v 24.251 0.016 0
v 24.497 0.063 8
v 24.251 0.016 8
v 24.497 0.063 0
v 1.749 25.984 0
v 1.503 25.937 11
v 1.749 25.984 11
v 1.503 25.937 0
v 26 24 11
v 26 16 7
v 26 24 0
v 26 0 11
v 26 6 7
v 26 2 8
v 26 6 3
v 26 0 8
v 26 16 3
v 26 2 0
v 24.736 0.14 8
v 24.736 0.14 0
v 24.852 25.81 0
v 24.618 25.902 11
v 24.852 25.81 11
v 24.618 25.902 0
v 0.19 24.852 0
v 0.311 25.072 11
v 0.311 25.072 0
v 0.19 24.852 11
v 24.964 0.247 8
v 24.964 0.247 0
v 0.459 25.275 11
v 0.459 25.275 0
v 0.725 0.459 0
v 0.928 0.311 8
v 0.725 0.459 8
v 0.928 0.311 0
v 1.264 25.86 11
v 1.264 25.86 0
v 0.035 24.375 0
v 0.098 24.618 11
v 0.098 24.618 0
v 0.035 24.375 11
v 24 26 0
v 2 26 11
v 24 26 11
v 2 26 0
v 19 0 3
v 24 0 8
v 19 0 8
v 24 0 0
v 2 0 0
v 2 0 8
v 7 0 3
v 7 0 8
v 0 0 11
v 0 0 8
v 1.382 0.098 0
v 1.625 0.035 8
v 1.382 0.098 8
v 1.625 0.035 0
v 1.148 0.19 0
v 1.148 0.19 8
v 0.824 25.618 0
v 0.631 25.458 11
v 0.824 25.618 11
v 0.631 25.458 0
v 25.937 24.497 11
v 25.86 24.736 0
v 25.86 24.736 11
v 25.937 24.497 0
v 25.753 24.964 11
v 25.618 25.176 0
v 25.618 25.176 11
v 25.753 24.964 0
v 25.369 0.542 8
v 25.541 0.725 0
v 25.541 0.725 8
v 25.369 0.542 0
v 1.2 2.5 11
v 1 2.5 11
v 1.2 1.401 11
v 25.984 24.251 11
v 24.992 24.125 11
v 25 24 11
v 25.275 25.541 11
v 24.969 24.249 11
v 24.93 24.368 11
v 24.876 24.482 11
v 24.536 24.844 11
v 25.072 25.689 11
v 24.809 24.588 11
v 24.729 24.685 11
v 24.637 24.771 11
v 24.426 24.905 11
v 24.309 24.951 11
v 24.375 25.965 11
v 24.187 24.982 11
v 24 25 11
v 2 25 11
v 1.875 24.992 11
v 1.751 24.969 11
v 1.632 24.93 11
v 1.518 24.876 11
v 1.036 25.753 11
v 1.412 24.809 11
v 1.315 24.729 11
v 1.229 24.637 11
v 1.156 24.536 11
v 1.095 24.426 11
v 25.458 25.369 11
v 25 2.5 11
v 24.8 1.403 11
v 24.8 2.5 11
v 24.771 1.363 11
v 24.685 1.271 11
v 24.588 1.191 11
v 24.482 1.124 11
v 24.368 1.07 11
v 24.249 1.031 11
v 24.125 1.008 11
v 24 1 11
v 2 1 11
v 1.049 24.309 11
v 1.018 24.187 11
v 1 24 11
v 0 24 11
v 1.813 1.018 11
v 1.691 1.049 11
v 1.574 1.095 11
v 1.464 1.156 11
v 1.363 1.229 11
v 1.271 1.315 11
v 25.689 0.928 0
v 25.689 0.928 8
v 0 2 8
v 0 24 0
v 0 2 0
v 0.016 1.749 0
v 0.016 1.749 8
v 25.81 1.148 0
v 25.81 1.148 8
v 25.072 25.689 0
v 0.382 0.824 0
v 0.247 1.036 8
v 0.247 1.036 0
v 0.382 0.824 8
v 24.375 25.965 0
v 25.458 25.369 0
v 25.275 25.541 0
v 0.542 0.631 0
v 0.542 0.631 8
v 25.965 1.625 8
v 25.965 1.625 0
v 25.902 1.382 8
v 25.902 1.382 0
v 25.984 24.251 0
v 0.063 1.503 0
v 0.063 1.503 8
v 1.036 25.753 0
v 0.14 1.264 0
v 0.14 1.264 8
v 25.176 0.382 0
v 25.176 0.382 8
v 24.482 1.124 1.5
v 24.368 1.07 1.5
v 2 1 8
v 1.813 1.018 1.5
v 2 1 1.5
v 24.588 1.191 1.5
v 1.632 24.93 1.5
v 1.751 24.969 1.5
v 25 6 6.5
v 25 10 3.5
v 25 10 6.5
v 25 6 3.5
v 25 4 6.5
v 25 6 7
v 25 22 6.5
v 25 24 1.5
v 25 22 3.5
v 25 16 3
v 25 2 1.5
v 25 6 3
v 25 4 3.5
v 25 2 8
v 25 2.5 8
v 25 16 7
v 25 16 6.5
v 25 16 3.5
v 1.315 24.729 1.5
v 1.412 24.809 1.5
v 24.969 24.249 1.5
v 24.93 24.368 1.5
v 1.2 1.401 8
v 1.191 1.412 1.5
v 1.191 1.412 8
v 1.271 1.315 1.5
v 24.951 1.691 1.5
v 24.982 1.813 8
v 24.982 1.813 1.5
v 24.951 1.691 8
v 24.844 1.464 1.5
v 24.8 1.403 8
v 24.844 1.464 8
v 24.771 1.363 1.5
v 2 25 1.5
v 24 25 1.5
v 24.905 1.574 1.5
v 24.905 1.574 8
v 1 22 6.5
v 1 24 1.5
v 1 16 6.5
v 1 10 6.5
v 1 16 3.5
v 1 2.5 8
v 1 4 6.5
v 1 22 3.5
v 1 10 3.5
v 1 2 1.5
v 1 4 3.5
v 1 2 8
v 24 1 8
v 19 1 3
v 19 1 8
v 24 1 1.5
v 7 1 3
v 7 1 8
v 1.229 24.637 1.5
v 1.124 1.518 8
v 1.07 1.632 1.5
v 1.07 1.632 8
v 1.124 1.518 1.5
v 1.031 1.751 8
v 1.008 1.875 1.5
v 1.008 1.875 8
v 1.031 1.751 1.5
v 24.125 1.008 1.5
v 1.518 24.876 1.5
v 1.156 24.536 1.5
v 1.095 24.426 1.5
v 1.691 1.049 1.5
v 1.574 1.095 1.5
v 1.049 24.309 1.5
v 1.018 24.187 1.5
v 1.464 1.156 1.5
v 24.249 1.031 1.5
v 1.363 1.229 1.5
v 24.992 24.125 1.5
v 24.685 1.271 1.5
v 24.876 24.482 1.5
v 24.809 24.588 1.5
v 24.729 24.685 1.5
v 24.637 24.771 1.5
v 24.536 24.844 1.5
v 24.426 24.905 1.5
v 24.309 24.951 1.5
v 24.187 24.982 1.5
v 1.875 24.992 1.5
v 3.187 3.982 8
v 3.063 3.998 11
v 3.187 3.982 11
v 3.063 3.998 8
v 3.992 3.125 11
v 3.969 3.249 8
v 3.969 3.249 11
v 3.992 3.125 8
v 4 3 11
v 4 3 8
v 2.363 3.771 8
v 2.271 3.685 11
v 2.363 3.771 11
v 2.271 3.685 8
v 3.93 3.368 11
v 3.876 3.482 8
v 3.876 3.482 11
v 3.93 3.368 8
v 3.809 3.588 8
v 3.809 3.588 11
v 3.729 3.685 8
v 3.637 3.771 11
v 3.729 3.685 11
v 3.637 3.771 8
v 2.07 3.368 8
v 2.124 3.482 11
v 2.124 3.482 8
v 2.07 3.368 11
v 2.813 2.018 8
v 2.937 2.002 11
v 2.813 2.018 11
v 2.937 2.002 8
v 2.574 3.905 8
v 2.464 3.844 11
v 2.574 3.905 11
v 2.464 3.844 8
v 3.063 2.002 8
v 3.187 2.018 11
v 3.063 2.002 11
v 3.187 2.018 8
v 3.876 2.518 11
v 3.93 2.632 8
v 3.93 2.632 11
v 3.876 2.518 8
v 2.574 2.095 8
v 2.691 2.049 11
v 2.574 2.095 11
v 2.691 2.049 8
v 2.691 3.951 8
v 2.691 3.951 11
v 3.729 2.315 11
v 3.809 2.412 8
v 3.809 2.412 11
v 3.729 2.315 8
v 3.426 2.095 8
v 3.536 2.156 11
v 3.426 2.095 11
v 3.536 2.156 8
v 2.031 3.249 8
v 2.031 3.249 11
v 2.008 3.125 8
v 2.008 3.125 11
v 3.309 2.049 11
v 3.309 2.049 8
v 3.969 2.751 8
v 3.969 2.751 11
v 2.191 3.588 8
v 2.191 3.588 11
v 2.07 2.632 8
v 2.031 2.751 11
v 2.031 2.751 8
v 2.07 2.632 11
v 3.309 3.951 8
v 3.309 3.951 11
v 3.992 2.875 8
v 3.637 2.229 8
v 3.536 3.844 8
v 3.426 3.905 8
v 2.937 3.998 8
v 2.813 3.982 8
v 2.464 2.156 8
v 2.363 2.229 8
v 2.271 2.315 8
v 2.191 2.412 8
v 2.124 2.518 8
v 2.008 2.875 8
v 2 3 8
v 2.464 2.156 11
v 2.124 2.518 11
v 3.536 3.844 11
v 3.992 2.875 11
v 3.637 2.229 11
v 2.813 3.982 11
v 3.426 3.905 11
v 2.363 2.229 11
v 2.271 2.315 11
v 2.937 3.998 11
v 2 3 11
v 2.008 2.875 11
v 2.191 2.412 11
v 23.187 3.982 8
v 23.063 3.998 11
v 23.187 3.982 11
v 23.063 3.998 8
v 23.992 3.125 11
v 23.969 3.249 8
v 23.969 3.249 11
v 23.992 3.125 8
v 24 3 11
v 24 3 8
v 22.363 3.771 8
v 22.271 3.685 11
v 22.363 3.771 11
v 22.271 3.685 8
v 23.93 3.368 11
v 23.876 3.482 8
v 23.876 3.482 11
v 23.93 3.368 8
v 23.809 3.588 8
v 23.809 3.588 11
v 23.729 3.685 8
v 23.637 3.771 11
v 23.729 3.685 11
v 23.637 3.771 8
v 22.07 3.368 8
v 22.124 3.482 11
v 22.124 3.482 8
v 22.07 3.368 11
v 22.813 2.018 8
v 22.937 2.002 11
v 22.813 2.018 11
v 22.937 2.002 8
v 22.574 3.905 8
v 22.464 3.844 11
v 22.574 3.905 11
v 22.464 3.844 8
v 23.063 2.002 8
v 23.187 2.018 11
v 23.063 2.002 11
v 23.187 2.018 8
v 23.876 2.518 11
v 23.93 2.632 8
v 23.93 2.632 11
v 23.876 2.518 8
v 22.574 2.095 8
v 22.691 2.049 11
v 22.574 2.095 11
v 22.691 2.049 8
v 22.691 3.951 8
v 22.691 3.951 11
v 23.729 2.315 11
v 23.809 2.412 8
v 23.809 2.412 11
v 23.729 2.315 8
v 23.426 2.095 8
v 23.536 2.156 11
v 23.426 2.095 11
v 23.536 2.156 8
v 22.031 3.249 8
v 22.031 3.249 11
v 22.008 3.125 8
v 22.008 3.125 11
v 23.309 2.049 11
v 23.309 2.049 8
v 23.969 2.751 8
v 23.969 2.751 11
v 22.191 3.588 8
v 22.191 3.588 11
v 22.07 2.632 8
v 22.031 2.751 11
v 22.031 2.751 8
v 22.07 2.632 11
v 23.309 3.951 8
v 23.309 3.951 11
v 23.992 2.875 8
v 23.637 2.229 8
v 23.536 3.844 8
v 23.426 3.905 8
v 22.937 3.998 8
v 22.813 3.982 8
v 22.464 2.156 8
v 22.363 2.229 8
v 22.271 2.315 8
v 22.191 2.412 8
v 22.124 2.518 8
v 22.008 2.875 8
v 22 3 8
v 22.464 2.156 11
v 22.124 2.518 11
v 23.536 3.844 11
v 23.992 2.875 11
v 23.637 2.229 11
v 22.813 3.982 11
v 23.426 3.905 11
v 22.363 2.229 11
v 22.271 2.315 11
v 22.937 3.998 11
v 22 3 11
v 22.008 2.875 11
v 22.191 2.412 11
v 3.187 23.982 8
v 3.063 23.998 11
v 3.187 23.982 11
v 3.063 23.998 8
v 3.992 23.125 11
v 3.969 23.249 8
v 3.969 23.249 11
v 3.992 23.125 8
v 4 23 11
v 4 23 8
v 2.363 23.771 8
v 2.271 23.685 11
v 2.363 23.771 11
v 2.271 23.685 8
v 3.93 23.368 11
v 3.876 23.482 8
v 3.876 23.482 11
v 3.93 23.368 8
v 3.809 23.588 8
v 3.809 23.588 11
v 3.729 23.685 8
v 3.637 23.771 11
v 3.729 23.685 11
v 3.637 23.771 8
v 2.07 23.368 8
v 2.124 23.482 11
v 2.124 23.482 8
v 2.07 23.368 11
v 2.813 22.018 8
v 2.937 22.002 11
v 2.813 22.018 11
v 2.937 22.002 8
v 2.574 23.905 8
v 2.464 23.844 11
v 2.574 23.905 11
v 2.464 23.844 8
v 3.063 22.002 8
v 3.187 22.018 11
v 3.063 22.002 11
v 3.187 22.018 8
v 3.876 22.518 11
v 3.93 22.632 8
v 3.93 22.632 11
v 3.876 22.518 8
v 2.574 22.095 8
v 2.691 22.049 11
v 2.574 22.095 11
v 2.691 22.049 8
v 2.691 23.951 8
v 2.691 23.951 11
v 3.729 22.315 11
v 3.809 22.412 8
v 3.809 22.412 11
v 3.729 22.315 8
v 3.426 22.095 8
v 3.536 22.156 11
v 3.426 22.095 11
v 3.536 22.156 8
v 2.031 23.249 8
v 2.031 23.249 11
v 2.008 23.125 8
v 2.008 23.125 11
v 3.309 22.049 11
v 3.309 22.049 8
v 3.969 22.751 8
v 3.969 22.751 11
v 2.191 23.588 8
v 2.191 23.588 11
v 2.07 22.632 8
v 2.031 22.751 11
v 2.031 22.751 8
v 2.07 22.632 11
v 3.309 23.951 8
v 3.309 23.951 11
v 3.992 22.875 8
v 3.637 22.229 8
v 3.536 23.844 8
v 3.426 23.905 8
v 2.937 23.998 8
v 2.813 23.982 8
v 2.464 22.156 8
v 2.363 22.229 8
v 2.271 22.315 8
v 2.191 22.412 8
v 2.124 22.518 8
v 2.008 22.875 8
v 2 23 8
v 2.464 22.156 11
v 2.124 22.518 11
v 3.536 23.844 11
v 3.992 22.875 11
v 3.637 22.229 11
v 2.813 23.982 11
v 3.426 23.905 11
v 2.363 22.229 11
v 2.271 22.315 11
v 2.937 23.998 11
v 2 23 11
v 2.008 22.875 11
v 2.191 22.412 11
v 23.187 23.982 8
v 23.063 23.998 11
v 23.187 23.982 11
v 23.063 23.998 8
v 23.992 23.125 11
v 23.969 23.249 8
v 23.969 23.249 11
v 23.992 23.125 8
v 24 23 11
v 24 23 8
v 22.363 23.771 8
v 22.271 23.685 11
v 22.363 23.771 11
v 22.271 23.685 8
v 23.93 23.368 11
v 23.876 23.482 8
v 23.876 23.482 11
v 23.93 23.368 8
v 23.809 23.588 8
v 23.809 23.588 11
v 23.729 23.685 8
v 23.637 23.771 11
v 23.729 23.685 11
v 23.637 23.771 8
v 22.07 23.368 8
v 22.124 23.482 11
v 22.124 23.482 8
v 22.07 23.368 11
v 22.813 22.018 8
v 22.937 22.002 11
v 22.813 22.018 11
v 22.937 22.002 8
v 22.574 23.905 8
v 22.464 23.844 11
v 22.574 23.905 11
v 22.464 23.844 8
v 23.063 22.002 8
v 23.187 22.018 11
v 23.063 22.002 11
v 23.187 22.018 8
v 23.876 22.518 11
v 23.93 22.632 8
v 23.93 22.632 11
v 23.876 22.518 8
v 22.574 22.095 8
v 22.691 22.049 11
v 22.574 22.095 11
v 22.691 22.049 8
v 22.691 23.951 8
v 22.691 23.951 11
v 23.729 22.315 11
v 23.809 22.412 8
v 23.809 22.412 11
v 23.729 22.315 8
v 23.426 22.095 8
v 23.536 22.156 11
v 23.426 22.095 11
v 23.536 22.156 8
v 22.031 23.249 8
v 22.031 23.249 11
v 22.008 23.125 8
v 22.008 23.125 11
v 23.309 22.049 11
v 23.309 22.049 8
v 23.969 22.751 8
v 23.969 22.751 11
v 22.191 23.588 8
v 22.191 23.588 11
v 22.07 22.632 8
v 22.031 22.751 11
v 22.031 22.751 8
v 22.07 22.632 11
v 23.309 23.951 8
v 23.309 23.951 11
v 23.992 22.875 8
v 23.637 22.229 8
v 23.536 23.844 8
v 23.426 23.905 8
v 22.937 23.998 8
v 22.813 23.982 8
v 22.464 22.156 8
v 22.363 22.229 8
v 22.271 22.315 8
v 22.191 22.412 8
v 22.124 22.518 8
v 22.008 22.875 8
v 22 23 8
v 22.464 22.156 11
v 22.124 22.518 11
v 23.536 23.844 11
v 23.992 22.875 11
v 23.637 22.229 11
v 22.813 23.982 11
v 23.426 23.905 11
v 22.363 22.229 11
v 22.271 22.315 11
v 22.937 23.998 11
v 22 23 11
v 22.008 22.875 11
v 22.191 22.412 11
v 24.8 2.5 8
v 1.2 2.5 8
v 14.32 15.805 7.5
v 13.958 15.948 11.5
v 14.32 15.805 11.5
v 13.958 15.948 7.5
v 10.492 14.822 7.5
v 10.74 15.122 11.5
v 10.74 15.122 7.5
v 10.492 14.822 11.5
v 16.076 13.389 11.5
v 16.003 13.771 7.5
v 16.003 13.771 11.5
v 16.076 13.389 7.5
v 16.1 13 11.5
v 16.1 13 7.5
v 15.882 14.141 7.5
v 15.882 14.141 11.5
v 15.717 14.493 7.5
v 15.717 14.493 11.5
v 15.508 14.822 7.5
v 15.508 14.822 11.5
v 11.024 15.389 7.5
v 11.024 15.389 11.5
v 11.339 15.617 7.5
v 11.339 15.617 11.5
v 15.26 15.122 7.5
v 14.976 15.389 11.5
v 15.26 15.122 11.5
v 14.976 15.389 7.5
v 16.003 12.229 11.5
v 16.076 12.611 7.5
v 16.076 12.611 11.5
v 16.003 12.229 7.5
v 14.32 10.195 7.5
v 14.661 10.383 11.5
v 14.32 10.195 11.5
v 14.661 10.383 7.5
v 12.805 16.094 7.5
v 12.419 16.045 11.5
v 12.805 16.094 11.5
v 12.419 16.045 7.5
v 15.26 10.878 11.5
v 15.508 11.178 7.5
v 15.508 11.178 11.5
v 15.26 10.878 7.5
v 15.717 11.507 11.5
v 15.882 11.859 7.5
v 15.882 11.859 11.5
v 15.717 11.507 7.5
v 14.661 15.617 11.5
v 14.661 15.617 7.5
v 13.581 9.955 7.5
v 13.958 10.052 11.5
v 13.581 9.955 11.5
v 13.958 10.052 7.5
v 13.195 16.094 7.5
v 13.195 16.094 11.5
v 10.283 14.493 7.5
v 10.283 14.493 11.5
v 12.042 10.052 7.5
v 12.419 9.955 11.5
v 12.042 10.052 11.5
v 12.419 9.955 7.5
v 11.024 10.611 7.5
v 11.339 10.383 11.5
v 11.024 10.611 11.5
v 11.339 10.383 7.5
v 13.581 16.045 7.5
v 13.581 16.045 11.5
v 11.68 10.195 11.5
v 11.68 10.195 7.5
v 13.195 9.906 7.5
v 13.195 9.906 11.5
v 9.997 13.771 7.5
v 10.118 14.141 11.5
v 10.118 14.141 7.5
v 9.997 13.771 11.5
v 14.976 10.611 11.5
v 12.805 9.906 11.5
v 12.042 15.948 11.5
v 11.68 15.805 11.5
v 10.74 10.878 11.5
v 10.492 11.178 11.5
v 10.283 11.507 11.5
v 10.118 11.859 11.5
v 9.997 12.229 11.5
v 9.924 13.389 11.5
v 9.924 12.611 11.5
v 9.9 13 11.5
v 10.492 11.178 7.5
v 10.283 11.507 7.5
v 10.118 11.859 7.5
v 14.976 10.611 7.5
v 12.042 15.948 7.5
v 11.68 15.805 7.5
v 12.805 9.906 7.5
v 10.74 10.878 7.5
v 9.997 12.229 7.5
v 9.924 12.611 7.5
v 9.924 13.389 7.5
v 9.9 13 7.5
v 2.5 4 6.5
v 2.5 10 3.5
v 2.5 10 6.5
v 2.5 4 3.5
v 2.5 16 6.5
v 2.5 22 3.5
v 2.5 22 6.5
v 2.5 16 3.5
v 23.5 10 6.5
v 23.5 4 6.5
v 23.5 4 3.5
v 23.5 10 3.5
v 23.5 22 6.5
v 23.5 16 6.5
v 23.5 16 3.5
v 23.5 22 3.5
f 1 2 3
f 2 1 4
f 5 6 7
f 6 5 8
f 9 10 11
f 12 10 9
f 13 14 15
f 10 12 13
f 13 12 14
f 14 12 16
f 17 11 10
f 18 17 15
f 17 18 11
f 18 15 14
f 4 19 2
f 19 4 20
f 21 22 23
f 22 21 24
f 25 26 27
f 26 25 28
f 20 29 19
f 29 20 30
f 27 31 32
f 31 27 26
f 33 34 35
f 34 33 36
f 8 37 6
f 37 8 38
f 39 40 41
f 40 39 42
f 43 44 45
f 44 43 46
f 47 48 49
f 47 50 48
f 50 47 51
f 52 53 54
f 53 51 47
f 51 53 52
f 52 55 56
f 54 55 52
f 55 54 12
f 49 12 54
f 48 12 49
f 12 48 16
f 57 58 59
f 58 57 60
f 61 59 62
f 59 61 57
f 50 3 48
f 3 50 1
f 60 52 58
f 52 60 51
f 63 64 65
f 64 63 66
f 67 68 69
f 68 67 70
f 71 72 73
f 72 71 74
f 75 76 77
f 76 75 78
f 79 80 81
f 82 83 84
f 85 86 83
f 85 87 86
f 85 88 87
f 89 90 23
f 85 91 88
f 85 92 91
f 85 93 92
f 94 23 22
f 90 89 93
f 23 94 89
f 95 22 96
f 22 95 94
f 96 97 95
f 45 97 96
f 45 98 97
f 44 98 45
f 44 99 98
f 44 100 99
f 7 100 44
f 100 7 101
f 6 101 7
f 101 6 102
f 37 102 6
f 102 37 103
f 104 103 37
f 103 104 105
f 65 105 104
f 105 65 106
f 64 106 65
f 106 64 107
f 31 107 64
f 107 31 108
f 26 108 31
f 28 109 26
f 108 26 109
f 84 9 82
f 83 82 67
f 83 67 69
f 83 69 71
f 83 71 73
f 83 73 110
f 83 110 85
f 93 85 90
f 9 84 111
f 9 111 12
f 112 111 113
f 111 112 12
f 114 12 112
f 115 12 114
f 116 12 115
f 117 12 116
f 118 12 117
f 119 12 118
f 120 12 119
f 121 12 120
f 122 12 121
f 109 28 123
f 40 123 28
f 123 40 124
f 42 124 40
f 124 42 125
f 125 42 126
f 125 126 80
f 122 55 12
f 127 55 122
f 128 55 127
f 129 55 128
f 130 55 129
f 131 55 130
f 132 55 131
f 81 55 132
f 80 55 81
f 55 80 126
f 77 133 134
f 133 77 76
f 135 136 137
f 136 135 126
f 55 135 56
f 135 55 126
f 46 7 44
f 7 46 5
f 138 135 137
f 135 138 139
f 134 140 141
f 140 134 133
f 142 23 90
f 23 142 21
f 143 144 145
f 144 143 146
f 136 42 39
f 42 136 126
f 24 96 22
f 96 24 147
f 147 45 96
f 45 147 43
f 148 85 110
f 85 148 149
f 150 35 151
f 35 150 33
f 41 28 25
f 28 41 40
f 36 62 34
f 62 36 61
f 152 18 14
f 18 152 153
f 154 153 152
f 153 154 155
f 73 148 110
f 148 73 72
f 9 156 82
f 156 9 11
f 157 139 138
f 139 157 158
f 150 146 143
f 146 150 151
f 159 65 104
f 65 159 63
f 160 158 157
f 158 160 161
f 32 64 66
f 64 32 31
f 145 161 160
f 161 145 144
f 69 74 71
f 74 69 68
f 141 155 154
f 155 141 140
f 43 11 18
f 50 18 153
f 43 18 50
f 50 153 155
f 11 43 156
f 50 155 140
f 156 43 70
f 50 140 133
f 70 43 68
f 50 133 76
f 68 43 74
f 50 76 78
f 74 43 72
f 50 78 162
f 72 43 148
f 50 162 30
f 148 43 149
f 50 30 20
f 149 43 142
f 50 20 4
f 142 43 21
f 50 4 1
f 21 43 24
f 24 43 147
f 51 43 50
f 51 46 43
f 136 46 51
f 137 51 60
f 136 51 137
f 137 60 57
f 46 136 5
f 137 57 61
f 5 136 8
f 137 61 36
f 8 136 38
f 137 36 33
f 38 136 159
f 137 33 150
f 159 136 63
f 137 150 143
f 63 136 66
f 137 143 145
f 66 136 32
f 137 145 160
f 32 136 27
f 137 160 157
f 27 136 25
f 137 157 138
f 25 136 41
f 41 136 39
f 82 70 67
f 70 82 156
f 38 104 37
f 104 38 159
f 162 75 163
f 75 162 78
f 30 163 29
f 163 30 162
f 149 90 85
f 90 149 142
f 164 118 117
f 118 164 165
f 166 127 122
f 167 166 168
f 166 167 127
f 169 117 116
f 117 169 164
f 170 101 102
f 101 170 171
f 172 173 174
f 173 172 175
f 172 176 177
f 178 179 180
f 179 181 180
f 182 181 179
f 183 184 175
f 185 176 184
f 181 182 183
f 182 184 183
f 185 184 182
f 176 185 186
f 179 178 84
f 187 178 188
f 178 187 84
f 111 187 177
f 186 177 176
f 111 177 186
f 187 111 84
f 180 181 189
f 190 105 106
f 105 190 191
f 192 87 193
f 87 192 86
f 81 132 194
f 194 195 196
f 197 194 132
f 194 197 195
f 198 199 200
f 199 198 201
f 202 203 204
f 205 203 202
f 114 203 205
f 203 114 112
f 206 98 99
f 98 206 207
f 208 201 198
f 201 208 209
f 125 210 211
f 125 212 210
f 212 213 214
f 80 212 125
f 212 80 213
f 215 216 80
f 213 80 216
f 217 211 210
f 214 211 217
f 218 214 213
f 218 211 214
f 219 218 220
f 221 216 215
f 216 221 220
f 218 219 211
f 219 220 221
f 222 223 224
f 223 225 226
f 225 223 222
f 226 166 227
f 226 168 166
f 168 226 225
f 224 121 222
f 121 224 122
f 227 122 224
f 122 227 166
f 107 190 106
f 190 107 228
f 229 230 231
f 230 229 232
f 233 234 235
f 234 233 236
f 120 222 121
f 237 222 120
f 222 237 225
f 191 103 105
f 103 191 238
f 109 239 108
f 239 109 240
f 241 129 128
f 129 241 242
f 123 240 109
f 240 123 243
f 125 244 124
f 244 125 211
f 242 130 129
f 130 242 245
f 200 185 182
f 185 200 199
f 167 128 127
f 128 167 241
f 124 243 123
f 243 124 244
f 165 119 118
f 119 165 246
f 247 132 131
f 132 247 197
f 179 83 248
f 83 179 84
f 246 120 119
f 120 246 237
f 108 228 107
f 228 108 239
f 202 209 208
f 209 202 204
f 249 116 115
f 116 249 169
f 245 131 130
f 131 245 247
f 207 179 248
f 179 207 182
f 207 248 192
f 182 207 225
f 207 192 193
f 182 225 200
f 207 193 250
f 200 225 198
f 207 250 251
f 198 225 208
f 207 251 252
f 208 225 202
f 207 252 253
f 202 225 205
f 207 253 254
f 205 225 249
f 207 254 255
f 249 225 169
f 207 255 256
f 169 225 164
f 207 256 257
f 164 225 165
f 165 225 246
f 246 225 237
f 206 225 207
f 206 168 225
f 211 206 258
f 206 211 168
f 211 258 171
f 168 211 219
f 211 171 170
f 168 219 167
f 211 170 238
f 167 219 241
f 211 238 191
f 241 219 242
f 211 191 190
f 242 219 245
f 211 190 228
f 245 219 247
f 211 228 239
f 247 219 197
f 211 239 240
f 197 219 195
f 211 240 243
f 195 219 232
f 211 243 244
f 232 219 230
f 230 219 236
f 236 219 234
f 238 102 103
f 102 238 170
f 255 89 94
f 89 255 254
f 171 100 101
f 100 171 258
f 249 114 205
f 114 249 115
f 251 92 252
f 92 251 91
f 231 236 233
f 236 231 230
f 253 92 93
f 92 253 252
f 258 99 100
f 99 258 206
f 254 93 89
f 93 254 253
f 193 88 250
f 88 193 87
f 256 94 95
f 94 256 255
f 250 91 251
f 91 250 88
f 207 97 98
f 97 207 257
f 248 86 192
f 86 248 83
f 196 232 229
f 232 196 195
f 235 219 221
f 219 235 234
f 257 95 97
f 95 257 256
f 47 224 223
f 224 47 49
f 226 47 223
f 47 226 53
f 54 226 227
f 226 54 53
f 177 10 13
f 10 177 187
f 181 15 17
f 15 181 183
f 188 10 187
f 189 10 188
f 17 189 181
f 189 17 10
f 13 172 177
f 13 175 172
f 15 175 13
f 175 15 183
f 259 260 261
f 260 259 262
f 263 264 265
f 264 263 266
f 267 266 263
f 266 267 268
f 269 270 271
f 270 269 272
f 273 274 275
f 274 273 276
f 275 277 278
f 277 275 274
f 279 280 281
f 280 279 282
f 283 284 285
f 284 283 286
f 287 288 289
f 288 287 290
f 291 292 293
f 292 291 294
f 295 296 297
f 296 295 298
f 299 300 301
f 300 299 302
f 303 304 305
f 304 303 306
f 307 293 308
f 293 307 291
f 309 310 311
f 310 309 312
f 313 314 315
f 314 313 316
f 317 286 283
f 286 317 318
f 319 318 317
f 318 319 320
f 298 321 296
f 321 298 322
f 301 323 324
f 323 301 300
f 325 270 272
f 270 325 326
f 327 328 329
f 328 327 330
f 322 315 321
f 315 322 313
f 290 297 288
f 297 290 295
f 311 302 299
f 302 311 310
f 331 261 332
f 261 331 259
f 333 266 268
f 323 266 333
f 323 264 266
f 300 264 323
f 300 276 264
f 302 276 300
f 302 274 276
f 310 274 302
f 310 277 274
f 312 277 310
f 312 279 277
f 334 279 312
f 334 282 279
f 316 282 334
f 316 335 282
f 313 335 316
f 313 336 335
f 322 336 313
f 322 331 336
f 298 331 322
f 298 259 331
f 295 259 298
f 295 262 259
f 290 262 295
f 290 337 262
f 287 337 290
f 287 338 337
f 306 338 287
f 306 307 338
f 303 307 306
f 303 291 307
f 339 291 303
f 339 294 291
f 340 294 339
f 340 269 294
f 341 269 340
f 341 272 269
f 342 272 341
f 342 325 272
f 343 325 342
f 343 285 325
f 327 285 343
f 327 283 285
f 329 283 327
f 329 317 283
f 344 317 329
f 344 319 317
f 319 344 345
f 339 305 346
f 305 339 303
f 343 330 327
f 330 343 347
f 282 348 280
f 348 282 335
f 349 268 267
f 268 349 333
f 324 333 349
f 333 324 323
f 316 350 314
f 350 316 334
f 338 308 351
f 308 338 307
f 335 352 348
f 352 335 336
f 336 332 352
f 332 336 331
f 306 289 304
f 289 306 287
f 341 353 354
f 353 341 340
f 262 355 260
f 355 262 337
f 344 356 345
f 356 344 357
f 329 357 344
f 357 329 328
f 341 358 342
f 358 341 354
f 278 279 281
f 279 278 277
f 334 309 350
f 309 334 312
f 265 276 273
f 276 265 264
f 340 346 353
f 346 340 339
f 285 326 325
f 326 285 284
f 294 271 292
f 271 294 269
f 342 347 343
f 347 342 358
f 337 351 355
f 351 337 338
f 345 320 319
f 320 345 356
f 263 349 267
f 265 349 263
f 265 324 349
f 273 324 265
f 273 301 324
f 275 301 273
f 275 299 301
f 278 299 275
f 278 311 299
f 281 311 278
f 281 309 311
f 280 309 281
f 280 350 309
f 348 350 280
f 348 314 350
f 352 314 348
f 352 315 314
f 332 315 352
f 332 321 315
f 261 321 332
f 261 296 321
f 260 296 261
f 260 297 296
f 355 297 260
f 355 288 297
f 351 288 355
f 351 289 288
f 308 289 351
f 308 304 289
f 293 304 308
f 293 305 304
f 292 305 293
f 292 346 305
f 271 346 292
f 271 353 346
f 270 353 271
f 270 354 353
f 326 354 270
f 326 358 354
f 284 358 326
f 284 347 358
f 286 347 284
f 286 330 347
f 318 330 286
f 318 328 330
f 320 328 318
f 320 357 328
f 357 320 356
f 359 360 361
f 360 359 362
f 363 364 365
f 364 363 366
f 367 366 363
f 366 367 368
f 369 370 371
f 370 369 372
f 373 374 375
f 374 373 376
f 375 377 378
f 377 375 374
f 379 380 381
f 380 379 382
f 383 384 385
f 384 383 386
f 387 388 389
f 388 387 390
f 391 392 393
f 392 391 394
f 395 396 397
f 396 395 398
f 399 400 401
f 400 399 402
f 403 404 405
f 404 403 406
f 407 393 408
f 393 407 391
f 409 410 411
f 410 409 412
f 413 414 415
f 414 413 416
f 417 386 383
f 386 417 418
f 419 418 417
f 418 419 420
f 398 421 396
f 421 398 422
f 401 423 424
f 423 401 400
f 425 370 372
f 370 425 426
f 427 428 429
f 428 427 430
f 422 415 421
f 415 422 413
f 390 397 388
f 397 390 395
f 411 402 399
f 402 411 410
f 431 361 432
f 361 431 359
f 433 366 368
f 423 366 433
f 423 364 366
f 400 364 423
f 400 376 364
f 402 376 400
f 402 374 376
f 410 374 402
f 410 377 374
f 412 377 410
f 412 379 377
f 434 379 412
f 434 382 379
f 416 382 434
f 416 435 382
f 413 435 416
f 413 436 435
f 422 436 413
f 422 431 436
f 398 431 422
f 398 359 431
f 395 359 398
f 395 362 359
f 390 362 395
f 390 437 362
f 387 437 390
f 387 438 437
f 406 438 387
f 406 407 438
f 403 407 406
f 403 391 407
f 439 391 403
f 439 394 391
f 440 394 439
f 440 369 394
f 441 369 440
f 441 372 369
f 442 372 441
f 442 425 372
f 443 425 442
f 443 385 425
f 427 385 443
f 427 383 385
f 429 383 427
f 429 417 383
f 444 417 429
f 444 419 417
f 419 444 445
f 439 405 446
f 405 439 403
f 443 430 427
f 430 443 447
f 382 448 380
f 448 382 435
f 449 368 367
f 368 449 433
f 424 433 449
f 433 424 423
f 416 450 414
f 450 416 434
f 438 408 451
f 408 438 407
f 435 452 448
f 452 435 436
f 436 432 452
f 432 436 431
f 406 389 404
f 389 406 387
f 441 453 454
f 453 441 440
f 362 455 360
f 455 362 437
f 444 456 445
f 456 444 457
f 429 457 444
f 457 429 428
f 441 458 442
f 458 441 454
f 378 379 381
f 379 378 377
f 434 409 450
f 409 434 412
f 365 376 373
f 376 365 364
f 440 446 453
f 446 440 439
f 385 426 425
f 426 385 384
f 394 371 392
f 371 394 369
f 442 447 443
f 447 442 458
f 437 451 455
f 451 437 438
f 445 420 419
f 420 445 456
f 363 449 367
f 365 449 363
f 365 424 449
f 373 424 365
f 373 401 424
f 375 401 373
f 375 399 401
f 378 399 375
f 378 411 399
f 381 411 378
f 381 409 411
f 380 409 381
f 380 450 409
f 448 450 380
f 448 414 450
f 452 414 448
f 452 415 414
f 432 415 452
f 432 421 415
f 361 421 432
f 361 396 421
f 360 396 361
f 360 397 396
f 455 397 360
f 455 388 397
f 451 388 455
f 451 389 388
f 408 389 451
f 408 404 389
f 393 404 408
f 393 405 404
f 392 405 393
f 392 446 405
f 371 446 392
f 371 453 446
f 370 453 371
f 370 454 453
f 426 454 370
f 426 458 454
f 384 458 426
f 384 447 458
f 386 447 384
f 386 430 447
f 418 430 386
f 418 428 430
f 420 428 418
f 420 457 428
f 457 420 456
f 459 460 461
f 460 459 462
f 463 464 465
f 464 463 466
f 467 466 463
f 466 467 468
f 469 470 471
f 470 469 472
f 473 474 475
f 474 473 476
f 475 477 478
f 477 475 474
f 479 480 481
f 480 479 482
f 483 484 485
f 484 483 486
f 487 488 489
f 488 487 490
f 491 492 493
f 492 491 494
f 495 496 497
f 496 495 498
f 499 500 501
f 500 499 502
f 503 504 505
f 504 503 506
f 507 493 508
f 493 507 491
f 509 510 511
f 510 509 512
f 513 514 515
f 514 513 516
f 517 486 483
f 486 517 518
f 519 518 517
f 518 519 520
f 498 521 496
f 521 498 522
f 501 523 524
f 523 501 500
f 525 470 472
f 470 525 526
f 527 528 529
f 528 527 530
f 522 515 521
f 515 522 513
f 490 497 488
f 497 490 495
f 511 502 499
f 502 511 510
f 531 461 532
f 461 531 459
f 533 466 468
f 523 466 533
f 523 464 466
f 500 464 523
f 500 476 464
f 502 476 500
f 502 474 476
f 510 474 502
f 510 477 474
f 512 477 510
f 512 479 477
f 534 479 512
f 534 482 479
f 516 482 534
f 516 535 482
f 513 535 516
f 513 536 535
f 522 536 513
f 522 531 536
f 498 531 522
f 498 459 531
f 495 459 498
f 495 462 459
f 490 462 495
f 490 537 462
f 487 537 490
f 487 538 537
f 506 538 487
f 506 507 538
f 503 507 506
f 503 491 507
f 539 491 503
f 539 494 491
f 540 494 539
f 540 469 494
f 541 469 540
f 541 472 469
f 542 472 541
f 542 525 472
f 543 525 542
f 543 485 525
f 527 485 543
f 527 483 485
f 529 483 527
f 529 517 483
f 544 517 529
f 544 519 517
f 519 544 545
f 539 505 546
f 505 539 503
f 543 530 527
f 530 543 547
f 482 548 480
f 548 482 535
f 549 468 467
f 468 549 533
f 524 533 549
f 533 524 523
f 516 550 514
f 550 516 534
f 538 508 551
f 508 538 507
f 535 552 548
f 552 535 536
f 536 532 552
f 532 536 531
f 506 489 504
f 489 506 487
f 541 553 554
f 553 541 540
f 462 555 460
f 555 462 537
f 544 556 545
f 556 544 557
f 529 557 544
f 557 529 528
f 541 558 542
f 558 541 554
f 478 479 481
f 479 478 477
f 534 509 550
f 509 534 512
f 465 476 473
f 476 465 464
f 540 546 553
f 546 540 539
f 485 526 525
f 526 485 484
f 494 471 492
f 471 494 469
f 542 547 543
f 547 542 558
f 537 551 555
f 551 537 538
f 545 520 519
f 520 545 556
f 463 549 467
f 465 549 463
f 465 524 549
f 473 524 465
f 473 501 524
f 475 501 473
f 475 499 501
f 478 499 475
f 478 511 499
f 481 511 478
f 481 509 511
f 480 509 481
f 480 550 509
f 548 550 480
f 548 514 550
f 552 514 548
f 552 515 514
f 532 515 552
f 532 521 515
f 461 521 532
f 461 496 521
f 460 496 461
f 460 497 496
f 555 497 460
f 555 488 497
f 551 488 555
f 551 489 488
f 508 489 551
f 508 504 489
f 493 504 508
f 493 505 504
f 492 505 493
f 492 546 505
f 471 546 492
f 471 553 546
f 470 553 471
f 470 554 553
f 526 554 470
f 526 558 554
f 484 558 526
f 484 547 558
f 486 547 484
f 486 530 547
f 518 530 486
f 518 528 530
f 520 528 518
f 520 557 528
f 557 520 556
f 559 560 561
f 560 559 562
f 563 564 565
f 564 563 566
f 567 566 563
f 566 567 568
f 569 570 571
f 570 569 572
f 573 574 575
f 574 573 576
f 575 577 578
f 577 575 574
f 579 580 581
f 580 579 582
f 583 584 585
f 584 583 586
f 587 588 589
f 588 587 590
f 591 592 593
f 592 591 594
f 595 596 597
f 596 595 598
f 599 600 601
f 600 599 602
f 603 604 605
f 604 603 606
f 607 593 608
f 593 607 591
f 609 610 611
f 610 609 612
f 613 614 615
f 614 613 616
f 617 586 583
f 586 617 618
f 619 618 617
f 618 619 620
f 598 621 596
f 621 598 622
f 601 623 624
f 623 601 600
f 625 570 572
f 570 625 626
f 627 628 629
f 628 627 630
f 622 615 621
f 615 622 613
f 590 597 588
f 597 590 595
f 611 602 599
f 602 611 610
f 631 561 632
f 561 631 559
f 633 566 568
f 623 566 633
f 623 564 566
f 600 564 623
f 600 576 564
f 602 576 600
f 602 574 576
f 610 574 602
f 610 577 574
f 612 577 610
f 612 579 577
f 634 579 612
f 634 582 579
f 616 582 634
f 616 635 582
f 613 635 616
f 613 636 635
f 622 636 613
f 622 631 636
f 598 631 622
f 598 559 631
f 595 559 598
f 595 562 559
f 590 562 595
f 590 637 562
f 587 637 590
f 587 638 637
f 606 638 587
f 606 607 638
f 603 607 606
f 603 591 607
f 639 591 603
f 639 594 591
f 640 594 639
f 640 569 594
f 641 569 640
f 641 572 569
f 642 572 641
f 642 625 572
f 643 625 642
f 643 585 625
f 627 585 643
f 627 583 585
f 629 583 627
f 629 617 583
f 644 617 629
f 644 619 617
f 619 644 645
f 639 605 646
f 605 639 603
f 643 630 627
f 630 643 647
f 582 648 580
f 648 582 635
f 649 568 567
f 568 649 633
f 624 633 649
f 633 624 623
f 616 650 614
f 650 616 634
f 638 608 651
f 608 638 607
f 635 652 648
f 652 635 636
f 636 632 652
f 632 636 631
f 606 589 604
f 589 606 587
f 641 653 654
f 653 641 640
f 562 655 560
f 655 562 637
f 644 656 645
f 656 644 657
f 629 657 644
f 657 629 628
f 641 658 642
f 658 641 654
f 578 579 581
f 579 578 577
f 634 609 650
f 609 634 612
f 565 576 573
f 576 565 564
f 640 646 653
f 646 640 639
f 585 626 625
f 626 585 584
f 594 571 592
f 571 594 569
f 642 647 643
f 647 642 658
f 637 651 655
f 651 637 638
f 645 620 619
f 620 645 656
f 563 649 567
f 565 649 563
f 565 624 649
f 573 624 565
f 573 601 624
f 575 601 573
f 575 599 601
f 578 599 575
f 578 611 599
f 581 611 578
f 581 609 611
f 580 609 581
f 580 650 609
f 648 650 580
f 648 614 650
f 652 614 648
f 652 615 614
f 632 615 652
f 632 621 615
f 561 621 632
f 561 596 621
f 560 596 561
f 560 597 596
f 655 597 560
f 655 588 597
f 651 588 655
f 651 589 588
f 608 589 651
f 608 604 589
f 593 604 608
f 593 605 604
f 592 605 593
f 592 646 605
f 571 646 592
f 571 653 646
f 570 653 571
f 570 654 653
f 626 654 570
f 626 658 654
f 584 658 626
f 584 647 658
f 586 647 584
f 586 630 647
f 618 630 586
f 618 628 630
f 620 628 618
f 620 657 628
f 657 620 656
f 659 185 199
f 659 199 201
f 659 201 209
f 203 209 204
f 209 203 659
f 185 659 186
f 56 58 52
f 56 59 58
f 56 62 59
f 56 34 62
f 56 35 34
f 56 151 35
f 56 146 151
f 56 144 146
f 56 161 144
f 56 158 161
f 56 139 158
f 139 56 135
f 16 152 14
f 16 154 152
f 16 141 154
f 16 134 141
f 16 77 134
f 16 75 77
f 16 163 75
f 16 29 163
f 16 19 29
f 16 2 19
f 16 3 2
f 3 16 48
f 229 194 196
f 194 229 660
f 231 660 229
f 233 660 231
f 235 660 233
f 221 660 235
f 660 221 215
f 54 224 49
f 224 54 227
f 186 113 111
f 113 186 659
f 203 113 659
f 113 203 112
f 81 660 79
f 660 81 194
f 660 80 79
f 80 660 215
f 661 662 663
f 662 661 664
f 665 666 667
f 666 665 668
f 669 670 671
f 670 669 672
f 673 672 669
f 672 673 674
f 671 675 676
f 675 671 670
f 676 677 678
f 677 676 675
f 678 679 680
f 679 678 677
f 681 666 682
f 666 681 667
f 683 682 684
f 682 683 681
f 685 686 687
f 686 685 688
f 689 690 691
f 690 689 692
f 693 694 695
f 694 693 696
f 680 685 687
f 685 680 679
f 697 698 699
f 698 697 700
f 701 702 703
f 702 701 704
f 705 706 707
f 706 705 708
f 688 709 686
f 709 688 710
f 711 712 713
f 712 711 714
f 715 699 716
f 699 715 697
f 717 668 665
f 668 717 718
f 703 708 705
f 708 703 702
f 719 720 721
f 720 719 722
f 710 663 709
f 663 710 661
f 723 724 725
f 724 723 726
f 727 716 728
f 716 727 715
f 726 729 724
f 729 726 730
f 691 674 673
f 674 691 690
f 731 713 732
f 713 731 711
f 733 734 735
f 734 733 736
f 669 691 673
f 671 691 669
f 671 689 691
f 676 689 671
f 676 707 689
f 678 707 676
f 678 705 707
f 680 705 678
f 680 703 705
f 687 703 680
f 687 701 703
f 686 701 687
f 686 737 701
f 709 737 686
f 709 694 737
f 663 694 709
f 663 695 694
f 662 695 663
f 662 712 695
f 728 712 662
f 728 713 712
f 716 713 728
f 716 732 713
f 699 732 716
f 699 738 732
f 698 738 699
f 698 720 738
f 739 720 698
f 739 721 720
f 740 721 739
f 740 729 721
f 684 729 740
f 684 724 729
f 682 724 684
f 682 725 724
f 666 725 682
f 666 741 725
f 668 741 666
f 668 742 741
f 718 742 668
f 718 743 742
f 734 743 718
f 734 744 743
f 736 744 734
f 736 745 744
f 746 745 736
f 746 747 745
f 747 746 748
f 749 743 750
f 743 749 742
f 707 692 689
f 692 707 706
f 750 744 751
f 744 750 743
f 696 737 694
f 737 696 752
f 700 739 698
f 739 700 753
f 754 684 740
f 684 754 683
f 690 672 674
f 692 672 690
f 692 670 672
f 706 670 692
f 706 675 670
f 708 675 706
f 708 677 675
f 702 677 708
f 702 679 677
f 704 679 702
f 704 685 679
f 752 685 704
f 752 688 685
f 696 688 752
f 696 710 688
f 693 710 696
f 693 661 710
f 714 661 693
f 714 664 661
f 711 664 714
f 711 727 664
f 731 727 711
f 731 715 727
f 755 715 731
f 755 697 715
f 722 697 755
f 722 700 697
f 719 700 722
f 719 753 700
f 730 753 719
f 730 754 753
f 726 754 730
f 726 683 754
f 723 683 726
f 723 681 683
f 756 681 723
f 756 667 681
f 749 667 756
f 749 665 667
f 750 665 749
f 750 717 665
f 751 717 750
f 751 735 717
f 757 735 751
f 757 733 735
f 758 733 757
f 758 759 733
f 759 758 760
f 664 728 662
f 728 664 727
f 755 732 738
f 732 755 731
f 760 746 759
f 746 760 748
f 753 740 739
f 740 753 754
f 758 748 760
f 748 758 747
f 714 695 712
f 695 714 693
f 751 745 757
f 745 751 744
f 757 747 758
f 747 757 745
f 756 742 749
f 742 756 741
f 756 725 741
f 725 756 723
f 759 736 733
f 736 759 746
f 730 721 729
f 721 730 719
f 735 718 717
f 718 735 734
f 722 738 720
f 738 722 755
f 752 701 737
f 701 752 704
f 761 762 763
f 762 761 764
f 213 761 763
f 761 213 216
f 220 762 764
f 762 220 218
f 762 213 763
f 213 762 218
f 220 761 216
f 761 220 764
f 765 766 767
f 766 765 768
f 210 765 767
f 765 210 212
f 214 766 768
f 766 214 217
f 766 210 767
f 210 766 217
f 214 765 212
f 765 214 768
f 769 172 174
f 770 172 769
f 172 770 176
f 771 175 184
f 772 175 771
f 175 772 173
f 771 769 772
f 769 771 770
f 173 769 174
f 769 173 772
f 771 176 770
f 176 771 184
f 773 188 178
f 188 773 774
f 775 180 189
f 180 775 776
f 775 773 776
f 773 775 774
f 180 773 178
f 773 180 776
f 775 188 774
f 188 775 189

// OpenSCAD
// ESP32 Pomodoro Button - Simple Backpack Enclosure
// Atom Lite on top, expansion board on bottom: snap-fit + magnet mount

// === Parameters ===
$fn = 50;

// Atom Lite dimensions
atom_size = 24;
atom_height = 9.5;

// PCB dimensions (same as Atom Lite)
pcb_size = 24;
pcb_thickness = 1.6;

// Component height on PCB
component_height = 4;  // TP4056, USB-C, etc.

// Magnet mount (6x3mm neodymium magnet, common size)
magnet_dia = 6;
magnet_height = 3;

// Snap-fit on GROVE side (top edge)
snap_gap = 0.2;  // Tight clearance for snap
snap_depth = 1.5;
snap_height = 3;

// Battery dimensions
battery_width = 30;
battery_length = 40;
battery_height = 5;

// === Simple Backpack Case ===
// Just the bottom part that holds the extension board and battery
module backpack() {
    // Base plate with walls
    base_thickness = 1.5;
    wall_height = component_height + battery_height + 2;
    
    union() {
        // Main shell with cutouts
        difference() {
            // Outer shell
            linear_extrude(height = wall_height)
                rounded_square(pcb_size + 2, pcb_size + 2, 2);
            
            // Hollow interior
            translate([1, 1, base_thickness])
                linear_extrude(height = wall_height)
                    rounded_square(pcb_size, pcb_size, 1);
            
            // USB-C opening (side)
            translate([(pcb_size + 2 - 12)/2, -0.5, wall_height - 8])
                cube([12, 2, 6]);
            
            // Switch opening (side)
            translate([pcb_size + 2 - 1.5, 6, wall_height - 8])
                cube([2, 10, 4]);
        }
        
        // Snap-fit on GROVE side (top edge - where GROVE connector is)
        // Add small lip on top edge to hold PCB in place
        translate([0, 0, wall_height - snap_height])
            linear_extrude(height = snap_height)
                difference() {
                    square([pcb_size + 2, snap_depth + 1]);
                    translate([1 + snap_gap, 1])
                        square([pcb_size - snap_gap*2, snap_depth]);
                };
        
        // Center magnet cavity (replace M2 screw)
        translate([(pcb_size + 2)/2, (pcb_size + 2)/2, wall_height - magnet_height - 0.5])
            cylinder(d=magnet_dia + 0.2, h=magnet_height + 1);  // Press-fit cavity
        
        // Small alignment pins (for stability, 4 corners)
        pin_positions = [
            [3, 3],
            [pcb_size + 2 - 3, 3],
            [3, pcb_size + 2 - 3],
            [pcb_size + 2 - 3, pcb_size + 2 - 3]
        ];
        
        for (pos = pin_positions) {
            translate([pos[0], pos[1], wall_height - 3])
                cylinder(d=2, h=3);
        }
        
        // Battery retention clips
        translate([1, 4, base_thickness + 2])
            cube([1.5, 6, battery_height - 2]);
        translate([1, pcb_size + 2 - 10, base_thickness + 2])
            cube([1.5, 6, battery_height - 2]);
        translate([pcb_size + 2 - 2.5, 4, base_thickness + 2])
            cube([1.5, 6, battery_height - 2]);
        translate([pcb_size + 2 - 2.5, pcb_size + 2 - 10, base_thickness + 2])
            cube([1.5, 6, battery_height - 2]);
    }
}

// === Helper: Rounded Square ===
module rounded_square(w, h, r) {
    if (r > 0) {
        offset(r = r) offset(r = -r)
            square([w, h]);
    } else {
        square([w, h]);
    }
}

// === Assembly Preview ===
module assembly() {
    // Backpack (bottom)
    color("gray", 0.7)
        backpack();
    
    // Extension PCB (visual)
    translate([1, 1, 6])
        color("green", 0.8)
        cube([24, 24, 1.6]);
    
    // Battery (visual)
    translate([3, 3, 1.5])
        color("blue", 0.5)
        cube([30, 40, 5]);
    
    // Magnet (visual)
    translate([(pcb_size + 2)/2, (pcb_size + 2)/2, wall_height - magnet_height - 0.5])
        color("silver")
        cylinder(d=magnet_dia, h=magnet_height);
    
    // Atom Lite (visual, on top)
    translate([1, 1, 15])
        color("darkgray")
        cube([24, 24, 9.5]);
    
    // GROVE cable (visual)
    color("black", 0.5) {
        translate([12, 25, 8])
            cube([6, 4, 2]);
        translate([12, 25, 16])
            cube([6, 4, 2]);
    }
}

// === Export ===
// Export the backpack:
backpack();

// Or preview assembly:
// assembly();
